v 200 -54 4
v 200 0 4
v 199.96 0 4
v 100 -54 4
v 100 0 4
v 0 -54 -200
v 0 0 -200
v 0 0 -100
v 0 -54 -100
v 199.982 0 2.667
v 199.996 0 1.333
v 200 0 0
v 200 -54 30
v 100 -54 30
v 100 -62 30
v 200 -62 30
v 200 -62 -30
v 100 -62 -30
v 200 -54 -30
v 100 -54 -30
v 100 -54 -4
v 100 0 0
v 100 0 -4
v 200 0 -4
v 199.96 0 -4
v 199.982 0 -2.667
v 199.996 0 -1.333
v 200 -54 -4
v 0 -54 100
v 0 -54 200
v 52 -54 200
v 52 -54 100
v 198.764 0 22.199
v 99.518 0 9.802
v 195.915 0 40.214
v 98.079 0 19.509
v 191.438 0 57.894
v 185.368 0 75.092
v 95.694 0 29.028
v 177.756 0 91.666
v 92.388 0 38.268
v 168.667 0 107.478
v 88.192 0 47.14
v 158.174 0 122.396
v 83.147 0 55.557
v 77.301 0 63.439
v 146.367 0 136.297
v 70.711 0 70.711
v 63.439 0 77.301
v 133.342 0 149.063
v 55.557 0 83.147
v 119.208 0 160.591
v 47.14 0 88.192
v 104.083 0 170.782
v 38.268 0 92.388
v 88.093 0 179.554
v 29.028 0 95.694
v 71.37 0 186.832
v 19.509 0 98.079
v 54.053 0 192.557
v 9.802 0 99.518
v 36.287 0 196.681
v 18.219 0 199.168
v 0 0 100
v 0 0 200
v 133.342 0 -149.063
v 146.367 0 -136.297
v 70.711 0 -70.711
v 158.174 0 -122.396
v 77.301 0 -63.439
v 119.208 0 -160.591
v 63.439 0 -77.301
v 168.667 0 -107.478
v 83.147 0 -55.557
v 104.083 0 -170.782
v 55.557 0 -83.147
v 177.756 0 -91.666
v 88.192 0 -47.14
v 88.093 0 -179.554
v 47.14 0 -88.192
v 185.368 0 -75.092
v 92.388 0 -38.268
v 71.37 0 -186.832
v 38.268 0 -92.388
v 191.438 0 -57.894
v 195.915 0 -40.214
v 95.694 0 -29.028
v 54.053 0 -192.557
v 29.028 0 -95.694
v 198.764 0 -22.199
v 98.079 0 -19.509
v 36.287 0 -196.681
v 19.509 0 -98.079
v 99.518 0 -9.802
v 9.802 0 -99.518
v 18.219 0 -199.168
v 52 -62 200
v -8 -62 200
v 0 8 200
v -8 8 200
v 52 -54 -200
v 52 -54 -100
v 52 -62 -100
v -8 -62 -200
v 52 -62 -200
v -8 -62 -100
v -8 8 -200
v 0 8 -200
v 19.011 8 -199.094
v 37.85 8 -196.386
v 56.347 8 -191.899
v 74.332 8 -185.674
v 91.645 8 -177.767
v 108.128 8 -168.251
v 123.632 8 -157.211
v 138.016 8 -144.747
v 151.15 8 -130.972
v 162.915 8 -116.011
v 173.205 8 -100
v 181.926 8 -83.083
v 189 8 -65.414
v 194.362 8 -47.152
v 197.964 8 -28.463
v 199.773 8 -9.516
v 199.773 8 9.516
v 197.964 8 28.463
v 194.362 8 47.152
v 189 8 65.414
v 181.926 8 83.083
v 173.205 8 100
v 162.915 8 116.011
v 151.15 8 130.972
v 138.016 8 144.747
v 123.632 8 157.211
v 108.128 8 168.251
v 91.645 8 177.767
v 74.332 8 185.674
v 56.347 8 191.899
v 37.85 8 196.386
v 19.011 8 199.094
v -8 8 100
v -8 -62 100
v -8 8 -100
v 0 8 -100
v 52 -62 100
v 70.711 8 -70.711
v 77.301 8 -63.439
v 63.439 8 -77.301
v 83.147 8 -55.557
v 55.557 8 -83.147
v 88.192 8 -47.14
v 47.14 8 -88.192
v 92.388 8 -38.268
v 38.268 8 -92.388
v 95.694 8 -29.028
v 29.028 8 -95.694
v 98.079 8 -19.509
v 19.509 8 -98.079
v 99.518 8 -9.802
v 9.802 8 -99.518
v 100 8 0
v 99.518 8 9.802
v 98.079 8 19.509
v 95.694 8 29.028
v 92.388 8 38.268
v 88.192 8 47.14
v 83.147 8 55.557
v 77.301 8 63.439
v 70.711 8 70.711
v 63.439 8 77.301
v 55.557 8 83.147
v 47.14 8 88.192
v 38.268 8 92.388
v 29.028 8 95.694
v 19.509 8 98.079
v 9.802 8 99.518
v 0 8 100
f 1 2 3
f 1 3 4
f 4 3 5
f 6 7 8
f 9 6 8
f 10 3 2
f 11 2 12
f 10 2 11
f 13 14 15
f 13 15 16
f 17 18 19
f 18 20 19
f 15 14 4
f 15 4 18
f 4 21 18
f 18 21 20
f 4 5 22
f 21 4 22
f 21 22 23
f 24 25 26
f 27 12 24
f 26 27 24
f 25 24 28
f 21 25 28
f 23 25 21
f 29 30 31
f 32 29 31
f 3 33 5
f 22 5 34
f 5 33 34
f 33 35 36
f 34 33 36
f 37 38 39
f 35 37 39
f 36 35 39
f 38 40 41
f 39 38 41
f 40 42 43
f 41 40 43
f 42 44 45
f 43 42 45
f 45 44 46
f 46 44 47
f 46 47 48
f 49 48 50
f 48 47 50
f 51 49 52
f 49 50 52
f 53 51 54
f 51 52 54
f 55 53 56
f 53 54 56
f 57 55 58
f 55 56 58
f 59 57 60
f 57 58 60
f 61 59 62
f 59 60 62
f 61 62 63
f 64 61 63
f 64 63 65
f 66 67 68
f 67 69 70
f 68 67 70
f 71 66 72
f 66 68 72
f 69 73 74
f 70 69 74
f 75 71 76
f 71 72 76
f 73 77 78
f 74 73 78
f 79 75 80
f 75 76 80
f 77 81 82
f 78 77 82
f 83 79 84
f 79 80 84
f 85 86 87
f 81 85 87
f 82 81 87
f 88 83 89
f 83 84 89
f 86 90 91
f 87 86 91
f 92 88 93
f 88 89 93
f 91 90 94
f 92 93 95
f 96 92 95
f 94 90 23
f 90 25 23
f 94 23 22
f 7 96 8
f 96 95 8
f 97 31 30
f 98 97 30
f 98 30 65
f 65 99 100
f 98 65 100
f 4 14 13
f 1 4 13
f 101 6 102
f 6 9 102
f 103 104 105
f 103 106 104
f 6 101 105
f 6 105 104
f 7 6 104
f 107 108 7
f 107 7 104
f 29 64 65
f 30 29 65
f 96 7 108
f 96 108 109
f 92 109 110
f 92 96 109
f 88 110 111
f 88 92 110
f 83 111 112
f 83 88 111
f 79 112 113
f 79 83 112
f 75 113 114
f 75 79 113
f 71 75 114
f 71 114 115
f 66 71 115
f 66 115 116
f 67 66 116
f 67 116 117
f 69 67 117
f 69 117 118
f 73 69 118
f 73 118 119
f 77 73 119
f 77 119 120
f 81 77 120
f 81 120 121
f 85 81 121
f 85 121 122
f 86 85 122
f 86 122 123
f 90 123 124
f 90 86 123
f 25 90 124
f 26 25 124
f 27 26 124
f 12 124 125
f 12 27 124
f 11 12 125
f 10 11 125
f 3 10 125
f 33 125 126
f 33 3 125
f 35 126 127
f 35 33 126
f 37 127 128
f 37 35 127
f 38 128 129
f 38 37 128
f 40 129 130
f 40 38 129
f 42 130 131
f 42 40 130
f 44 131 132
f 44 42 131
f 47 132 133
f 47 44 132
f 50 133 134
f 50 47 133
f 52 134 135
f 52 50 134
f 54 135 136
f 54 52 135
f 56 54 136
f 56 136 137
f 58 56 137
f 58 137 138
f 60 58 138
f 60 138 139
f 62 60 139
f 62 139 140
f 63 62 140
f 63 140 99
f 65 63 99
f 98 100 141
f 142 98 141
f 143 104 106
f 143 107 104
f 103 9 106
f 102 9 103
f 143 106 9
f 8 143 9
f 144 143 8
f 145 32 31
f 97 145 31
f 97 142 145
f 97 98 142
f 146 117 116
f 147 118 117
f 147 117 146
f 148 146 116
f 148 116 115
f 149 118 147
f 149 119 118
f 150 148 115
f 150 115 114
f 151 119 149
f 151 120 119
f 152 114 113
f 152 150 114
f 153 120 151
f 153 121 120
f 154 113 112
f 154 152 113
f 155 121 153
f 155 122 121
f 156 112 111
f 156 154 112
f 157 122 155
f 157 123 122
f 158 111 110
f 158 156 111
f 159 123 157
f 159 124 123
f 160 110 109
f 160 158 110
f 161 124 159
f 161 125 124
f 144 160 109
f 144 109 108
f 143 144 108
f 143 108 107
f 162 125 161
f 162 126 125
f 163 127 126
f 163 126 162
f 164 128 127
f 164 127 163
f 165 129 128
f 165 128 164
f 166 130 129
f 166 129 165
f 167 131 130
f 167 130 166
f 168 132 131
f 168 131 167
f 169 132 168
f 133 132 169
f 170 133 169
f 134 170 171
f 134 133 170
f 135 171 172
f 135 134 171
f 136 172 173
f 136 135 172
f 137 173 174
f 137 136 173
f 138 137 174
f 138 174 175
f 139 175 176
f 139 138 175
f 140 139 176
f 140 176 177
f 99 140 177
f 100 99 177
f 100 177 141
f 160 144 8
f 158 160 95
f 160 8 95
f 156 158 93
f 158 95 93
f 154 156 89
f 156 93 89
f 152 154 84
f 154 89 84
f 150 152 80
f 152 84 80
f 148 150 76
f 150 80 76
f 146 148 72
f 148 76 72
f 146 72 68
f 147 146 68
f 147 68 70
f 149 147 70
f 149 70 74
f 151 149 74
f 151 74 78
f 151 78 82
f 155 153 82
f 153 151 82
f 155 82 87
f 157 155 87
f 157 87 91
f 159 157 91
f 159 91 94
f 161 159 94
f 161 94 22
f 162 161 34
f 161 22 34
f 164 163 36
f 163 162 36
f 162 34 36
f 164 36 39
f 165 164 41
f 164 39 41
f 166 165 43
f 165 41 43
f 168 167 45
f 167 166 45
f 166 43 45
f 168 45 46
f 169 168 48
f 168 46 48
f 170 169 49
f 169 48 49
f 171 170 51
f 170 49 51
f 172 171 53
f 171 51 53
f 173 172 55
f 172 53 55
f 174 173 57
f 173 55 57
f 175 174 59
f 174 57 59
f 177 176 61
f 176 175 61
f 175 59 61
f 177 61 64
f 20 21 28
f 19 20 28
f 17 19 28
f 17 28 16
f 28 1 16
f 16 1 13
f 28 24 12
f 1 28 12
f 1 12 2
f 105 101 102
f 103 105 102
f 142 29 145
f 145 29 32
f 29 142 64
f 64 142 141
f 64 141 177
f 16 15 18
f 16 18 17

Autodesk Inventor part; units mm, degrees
ref_plane "YZ Plane" through (0, 0, 0) normal (1, 0, 0) x (0, 1, 0)
ref_plane "XZ Plane" through (0, 0, 0) normal (0, 1, 0) x (-1, 0, 0)
ref_plane "XY Plane" through (0, 0, 0) normal (0, 0, 1) x (1, 0, 0)
sketch "Sketch1" plane through (0, 0, 0) normal (0, 1, 0) x (-1, 0, 0)
  arc A0 (0, 100) -> (0, -100) centre (0, 0) ccw
  arc A1 (0, 200) -> (0, -200) centre (0, 0) ccw
  line L0 (0, 200) -> (0, 100)
  line L1 (0, -100) -> (0, -200)
  dimension "d0" = 200
  dimension "d1" = 400
extrude "Extrusion1" add sketch "Sketch1" along normal blind 8
sketch "Sketch2" plane through (0, 8, 0) normal (0, 1, 0) x (1, 0, 0)
  line L0 (0, -100) -> (0, -200) projected
  line L1 (0, -200) -> (-8, -200)
  line L2 (-8, -200) -> (-8, -100)
  line L3 (-8, -100) -> (0, -100)
  line L4 (0, -100) -> (0, -200)
  line L5 (0, 200) -> (0, 100) projected
  line L6 (0, 100) -> (0, 200)
  line L7 (0, 200) -> (-8, 200)
  line L8 (-8, 200) -> (-8, 100)
  line L9 (-8, 100) -> (0, 100)
  point P0 (0, 0)
  dimension "d4" = 8
  dimension "d5" = 100
  dimension "d6" = 8
  dimension "d7" = 100
extrude "Extrusion2" add sketch "Sketch2" against normal blind 62
sketch "Sketch3" plane through (0, -54, 0) normal (0, -1, 0) x (1, 0, 0)
  line L0 (-8, -100) -> (-8, -200) projected
  line L1 (-8, -200) -> (52, -200)
  line L2 (52, -200) -> (52, -100)
  line L3 (52, -100) -> (-8, -100)
  line L4 (-8, -100) -> (-8, -200)
  line L5 (-8, 200) -> (-8, 100) projected
  line L6 (-8, 100) -> (52, 100)
  line L7 (52, 100) -> (52, 200)
  line L8 (52, 200) -> (-8, 200)
  line L9 (-8, 200) -> (-8, 100)
  point P0 (0, 0)
  dimension "d10" = 60
  dimension "d11" = 60
extrude "Extrusion3" add sketch "Sketch3" along normal blind 8
sketch "Sketch4" plane through (0, 0, 0) normal (0, -1, 0) x (1, 0, 0)
  arc A0 (0, -100) -> (0, 100) centre (0, 0) ccw projected
  line L0 (100, 0) -> (200, 0)
  line L1 (200, 0) -> (200, 4)
  line L2 (200, 4) -> (100, 4)
  line L3 (100, 4) -> (100, 0)
  line L4 (100, 0) -> (200, 0)
  line L5 (200, 0) -> (200, -4)
  line L6 (200, -4) -> (100, -4)
  line L7 (100, -4) -> (100, 0)
  dimension "d14" = 100
  dimension "d15" = 4
  dimension "d16" = 100
  dimension "d17" = 4
extrude "Extrusion4" add sketch "Sketch4" along normal blind 54
sketch "Sketch5" plane through (0, -54, 0) normal (0, -1, 0) x (1, 0, 0)
  line L0 (200, -4) -> (200, 4) projected
  line L1 (200, 0) -> (100, 0)
  line L2 (100, 0) -> (100, -30)
  line L3 (100, -30) -> (200, -30)
  line L4 (200, -30) -> (200, 0)
  line L5 (200, 0) -> (100, 0)
  line L6 (100, 0) -> (100, 30)
  line L7 (100, 30) -> (200, 30)
  line L8 (200, 30) -> (200, 0)
  point P0 (0, 0)
  dimension "d20" = 100
  dimension "d21" = 30
  dimension "d22" = 100
  dimension "d23" = 30
extrude "Extrusion5" add sketch "Sketch5" along normal blind 8
sketch "Sketch6" plane through (0, 8, 0) normal (0, 1, 0) x (1, 0, 0)
  circle A0 centre (146.0864, 0) radius 2.5
  point P0 (0, 0)
  dimension "d26" = 5
properties part number "Cuptable1" material "Wood (Birch)"
